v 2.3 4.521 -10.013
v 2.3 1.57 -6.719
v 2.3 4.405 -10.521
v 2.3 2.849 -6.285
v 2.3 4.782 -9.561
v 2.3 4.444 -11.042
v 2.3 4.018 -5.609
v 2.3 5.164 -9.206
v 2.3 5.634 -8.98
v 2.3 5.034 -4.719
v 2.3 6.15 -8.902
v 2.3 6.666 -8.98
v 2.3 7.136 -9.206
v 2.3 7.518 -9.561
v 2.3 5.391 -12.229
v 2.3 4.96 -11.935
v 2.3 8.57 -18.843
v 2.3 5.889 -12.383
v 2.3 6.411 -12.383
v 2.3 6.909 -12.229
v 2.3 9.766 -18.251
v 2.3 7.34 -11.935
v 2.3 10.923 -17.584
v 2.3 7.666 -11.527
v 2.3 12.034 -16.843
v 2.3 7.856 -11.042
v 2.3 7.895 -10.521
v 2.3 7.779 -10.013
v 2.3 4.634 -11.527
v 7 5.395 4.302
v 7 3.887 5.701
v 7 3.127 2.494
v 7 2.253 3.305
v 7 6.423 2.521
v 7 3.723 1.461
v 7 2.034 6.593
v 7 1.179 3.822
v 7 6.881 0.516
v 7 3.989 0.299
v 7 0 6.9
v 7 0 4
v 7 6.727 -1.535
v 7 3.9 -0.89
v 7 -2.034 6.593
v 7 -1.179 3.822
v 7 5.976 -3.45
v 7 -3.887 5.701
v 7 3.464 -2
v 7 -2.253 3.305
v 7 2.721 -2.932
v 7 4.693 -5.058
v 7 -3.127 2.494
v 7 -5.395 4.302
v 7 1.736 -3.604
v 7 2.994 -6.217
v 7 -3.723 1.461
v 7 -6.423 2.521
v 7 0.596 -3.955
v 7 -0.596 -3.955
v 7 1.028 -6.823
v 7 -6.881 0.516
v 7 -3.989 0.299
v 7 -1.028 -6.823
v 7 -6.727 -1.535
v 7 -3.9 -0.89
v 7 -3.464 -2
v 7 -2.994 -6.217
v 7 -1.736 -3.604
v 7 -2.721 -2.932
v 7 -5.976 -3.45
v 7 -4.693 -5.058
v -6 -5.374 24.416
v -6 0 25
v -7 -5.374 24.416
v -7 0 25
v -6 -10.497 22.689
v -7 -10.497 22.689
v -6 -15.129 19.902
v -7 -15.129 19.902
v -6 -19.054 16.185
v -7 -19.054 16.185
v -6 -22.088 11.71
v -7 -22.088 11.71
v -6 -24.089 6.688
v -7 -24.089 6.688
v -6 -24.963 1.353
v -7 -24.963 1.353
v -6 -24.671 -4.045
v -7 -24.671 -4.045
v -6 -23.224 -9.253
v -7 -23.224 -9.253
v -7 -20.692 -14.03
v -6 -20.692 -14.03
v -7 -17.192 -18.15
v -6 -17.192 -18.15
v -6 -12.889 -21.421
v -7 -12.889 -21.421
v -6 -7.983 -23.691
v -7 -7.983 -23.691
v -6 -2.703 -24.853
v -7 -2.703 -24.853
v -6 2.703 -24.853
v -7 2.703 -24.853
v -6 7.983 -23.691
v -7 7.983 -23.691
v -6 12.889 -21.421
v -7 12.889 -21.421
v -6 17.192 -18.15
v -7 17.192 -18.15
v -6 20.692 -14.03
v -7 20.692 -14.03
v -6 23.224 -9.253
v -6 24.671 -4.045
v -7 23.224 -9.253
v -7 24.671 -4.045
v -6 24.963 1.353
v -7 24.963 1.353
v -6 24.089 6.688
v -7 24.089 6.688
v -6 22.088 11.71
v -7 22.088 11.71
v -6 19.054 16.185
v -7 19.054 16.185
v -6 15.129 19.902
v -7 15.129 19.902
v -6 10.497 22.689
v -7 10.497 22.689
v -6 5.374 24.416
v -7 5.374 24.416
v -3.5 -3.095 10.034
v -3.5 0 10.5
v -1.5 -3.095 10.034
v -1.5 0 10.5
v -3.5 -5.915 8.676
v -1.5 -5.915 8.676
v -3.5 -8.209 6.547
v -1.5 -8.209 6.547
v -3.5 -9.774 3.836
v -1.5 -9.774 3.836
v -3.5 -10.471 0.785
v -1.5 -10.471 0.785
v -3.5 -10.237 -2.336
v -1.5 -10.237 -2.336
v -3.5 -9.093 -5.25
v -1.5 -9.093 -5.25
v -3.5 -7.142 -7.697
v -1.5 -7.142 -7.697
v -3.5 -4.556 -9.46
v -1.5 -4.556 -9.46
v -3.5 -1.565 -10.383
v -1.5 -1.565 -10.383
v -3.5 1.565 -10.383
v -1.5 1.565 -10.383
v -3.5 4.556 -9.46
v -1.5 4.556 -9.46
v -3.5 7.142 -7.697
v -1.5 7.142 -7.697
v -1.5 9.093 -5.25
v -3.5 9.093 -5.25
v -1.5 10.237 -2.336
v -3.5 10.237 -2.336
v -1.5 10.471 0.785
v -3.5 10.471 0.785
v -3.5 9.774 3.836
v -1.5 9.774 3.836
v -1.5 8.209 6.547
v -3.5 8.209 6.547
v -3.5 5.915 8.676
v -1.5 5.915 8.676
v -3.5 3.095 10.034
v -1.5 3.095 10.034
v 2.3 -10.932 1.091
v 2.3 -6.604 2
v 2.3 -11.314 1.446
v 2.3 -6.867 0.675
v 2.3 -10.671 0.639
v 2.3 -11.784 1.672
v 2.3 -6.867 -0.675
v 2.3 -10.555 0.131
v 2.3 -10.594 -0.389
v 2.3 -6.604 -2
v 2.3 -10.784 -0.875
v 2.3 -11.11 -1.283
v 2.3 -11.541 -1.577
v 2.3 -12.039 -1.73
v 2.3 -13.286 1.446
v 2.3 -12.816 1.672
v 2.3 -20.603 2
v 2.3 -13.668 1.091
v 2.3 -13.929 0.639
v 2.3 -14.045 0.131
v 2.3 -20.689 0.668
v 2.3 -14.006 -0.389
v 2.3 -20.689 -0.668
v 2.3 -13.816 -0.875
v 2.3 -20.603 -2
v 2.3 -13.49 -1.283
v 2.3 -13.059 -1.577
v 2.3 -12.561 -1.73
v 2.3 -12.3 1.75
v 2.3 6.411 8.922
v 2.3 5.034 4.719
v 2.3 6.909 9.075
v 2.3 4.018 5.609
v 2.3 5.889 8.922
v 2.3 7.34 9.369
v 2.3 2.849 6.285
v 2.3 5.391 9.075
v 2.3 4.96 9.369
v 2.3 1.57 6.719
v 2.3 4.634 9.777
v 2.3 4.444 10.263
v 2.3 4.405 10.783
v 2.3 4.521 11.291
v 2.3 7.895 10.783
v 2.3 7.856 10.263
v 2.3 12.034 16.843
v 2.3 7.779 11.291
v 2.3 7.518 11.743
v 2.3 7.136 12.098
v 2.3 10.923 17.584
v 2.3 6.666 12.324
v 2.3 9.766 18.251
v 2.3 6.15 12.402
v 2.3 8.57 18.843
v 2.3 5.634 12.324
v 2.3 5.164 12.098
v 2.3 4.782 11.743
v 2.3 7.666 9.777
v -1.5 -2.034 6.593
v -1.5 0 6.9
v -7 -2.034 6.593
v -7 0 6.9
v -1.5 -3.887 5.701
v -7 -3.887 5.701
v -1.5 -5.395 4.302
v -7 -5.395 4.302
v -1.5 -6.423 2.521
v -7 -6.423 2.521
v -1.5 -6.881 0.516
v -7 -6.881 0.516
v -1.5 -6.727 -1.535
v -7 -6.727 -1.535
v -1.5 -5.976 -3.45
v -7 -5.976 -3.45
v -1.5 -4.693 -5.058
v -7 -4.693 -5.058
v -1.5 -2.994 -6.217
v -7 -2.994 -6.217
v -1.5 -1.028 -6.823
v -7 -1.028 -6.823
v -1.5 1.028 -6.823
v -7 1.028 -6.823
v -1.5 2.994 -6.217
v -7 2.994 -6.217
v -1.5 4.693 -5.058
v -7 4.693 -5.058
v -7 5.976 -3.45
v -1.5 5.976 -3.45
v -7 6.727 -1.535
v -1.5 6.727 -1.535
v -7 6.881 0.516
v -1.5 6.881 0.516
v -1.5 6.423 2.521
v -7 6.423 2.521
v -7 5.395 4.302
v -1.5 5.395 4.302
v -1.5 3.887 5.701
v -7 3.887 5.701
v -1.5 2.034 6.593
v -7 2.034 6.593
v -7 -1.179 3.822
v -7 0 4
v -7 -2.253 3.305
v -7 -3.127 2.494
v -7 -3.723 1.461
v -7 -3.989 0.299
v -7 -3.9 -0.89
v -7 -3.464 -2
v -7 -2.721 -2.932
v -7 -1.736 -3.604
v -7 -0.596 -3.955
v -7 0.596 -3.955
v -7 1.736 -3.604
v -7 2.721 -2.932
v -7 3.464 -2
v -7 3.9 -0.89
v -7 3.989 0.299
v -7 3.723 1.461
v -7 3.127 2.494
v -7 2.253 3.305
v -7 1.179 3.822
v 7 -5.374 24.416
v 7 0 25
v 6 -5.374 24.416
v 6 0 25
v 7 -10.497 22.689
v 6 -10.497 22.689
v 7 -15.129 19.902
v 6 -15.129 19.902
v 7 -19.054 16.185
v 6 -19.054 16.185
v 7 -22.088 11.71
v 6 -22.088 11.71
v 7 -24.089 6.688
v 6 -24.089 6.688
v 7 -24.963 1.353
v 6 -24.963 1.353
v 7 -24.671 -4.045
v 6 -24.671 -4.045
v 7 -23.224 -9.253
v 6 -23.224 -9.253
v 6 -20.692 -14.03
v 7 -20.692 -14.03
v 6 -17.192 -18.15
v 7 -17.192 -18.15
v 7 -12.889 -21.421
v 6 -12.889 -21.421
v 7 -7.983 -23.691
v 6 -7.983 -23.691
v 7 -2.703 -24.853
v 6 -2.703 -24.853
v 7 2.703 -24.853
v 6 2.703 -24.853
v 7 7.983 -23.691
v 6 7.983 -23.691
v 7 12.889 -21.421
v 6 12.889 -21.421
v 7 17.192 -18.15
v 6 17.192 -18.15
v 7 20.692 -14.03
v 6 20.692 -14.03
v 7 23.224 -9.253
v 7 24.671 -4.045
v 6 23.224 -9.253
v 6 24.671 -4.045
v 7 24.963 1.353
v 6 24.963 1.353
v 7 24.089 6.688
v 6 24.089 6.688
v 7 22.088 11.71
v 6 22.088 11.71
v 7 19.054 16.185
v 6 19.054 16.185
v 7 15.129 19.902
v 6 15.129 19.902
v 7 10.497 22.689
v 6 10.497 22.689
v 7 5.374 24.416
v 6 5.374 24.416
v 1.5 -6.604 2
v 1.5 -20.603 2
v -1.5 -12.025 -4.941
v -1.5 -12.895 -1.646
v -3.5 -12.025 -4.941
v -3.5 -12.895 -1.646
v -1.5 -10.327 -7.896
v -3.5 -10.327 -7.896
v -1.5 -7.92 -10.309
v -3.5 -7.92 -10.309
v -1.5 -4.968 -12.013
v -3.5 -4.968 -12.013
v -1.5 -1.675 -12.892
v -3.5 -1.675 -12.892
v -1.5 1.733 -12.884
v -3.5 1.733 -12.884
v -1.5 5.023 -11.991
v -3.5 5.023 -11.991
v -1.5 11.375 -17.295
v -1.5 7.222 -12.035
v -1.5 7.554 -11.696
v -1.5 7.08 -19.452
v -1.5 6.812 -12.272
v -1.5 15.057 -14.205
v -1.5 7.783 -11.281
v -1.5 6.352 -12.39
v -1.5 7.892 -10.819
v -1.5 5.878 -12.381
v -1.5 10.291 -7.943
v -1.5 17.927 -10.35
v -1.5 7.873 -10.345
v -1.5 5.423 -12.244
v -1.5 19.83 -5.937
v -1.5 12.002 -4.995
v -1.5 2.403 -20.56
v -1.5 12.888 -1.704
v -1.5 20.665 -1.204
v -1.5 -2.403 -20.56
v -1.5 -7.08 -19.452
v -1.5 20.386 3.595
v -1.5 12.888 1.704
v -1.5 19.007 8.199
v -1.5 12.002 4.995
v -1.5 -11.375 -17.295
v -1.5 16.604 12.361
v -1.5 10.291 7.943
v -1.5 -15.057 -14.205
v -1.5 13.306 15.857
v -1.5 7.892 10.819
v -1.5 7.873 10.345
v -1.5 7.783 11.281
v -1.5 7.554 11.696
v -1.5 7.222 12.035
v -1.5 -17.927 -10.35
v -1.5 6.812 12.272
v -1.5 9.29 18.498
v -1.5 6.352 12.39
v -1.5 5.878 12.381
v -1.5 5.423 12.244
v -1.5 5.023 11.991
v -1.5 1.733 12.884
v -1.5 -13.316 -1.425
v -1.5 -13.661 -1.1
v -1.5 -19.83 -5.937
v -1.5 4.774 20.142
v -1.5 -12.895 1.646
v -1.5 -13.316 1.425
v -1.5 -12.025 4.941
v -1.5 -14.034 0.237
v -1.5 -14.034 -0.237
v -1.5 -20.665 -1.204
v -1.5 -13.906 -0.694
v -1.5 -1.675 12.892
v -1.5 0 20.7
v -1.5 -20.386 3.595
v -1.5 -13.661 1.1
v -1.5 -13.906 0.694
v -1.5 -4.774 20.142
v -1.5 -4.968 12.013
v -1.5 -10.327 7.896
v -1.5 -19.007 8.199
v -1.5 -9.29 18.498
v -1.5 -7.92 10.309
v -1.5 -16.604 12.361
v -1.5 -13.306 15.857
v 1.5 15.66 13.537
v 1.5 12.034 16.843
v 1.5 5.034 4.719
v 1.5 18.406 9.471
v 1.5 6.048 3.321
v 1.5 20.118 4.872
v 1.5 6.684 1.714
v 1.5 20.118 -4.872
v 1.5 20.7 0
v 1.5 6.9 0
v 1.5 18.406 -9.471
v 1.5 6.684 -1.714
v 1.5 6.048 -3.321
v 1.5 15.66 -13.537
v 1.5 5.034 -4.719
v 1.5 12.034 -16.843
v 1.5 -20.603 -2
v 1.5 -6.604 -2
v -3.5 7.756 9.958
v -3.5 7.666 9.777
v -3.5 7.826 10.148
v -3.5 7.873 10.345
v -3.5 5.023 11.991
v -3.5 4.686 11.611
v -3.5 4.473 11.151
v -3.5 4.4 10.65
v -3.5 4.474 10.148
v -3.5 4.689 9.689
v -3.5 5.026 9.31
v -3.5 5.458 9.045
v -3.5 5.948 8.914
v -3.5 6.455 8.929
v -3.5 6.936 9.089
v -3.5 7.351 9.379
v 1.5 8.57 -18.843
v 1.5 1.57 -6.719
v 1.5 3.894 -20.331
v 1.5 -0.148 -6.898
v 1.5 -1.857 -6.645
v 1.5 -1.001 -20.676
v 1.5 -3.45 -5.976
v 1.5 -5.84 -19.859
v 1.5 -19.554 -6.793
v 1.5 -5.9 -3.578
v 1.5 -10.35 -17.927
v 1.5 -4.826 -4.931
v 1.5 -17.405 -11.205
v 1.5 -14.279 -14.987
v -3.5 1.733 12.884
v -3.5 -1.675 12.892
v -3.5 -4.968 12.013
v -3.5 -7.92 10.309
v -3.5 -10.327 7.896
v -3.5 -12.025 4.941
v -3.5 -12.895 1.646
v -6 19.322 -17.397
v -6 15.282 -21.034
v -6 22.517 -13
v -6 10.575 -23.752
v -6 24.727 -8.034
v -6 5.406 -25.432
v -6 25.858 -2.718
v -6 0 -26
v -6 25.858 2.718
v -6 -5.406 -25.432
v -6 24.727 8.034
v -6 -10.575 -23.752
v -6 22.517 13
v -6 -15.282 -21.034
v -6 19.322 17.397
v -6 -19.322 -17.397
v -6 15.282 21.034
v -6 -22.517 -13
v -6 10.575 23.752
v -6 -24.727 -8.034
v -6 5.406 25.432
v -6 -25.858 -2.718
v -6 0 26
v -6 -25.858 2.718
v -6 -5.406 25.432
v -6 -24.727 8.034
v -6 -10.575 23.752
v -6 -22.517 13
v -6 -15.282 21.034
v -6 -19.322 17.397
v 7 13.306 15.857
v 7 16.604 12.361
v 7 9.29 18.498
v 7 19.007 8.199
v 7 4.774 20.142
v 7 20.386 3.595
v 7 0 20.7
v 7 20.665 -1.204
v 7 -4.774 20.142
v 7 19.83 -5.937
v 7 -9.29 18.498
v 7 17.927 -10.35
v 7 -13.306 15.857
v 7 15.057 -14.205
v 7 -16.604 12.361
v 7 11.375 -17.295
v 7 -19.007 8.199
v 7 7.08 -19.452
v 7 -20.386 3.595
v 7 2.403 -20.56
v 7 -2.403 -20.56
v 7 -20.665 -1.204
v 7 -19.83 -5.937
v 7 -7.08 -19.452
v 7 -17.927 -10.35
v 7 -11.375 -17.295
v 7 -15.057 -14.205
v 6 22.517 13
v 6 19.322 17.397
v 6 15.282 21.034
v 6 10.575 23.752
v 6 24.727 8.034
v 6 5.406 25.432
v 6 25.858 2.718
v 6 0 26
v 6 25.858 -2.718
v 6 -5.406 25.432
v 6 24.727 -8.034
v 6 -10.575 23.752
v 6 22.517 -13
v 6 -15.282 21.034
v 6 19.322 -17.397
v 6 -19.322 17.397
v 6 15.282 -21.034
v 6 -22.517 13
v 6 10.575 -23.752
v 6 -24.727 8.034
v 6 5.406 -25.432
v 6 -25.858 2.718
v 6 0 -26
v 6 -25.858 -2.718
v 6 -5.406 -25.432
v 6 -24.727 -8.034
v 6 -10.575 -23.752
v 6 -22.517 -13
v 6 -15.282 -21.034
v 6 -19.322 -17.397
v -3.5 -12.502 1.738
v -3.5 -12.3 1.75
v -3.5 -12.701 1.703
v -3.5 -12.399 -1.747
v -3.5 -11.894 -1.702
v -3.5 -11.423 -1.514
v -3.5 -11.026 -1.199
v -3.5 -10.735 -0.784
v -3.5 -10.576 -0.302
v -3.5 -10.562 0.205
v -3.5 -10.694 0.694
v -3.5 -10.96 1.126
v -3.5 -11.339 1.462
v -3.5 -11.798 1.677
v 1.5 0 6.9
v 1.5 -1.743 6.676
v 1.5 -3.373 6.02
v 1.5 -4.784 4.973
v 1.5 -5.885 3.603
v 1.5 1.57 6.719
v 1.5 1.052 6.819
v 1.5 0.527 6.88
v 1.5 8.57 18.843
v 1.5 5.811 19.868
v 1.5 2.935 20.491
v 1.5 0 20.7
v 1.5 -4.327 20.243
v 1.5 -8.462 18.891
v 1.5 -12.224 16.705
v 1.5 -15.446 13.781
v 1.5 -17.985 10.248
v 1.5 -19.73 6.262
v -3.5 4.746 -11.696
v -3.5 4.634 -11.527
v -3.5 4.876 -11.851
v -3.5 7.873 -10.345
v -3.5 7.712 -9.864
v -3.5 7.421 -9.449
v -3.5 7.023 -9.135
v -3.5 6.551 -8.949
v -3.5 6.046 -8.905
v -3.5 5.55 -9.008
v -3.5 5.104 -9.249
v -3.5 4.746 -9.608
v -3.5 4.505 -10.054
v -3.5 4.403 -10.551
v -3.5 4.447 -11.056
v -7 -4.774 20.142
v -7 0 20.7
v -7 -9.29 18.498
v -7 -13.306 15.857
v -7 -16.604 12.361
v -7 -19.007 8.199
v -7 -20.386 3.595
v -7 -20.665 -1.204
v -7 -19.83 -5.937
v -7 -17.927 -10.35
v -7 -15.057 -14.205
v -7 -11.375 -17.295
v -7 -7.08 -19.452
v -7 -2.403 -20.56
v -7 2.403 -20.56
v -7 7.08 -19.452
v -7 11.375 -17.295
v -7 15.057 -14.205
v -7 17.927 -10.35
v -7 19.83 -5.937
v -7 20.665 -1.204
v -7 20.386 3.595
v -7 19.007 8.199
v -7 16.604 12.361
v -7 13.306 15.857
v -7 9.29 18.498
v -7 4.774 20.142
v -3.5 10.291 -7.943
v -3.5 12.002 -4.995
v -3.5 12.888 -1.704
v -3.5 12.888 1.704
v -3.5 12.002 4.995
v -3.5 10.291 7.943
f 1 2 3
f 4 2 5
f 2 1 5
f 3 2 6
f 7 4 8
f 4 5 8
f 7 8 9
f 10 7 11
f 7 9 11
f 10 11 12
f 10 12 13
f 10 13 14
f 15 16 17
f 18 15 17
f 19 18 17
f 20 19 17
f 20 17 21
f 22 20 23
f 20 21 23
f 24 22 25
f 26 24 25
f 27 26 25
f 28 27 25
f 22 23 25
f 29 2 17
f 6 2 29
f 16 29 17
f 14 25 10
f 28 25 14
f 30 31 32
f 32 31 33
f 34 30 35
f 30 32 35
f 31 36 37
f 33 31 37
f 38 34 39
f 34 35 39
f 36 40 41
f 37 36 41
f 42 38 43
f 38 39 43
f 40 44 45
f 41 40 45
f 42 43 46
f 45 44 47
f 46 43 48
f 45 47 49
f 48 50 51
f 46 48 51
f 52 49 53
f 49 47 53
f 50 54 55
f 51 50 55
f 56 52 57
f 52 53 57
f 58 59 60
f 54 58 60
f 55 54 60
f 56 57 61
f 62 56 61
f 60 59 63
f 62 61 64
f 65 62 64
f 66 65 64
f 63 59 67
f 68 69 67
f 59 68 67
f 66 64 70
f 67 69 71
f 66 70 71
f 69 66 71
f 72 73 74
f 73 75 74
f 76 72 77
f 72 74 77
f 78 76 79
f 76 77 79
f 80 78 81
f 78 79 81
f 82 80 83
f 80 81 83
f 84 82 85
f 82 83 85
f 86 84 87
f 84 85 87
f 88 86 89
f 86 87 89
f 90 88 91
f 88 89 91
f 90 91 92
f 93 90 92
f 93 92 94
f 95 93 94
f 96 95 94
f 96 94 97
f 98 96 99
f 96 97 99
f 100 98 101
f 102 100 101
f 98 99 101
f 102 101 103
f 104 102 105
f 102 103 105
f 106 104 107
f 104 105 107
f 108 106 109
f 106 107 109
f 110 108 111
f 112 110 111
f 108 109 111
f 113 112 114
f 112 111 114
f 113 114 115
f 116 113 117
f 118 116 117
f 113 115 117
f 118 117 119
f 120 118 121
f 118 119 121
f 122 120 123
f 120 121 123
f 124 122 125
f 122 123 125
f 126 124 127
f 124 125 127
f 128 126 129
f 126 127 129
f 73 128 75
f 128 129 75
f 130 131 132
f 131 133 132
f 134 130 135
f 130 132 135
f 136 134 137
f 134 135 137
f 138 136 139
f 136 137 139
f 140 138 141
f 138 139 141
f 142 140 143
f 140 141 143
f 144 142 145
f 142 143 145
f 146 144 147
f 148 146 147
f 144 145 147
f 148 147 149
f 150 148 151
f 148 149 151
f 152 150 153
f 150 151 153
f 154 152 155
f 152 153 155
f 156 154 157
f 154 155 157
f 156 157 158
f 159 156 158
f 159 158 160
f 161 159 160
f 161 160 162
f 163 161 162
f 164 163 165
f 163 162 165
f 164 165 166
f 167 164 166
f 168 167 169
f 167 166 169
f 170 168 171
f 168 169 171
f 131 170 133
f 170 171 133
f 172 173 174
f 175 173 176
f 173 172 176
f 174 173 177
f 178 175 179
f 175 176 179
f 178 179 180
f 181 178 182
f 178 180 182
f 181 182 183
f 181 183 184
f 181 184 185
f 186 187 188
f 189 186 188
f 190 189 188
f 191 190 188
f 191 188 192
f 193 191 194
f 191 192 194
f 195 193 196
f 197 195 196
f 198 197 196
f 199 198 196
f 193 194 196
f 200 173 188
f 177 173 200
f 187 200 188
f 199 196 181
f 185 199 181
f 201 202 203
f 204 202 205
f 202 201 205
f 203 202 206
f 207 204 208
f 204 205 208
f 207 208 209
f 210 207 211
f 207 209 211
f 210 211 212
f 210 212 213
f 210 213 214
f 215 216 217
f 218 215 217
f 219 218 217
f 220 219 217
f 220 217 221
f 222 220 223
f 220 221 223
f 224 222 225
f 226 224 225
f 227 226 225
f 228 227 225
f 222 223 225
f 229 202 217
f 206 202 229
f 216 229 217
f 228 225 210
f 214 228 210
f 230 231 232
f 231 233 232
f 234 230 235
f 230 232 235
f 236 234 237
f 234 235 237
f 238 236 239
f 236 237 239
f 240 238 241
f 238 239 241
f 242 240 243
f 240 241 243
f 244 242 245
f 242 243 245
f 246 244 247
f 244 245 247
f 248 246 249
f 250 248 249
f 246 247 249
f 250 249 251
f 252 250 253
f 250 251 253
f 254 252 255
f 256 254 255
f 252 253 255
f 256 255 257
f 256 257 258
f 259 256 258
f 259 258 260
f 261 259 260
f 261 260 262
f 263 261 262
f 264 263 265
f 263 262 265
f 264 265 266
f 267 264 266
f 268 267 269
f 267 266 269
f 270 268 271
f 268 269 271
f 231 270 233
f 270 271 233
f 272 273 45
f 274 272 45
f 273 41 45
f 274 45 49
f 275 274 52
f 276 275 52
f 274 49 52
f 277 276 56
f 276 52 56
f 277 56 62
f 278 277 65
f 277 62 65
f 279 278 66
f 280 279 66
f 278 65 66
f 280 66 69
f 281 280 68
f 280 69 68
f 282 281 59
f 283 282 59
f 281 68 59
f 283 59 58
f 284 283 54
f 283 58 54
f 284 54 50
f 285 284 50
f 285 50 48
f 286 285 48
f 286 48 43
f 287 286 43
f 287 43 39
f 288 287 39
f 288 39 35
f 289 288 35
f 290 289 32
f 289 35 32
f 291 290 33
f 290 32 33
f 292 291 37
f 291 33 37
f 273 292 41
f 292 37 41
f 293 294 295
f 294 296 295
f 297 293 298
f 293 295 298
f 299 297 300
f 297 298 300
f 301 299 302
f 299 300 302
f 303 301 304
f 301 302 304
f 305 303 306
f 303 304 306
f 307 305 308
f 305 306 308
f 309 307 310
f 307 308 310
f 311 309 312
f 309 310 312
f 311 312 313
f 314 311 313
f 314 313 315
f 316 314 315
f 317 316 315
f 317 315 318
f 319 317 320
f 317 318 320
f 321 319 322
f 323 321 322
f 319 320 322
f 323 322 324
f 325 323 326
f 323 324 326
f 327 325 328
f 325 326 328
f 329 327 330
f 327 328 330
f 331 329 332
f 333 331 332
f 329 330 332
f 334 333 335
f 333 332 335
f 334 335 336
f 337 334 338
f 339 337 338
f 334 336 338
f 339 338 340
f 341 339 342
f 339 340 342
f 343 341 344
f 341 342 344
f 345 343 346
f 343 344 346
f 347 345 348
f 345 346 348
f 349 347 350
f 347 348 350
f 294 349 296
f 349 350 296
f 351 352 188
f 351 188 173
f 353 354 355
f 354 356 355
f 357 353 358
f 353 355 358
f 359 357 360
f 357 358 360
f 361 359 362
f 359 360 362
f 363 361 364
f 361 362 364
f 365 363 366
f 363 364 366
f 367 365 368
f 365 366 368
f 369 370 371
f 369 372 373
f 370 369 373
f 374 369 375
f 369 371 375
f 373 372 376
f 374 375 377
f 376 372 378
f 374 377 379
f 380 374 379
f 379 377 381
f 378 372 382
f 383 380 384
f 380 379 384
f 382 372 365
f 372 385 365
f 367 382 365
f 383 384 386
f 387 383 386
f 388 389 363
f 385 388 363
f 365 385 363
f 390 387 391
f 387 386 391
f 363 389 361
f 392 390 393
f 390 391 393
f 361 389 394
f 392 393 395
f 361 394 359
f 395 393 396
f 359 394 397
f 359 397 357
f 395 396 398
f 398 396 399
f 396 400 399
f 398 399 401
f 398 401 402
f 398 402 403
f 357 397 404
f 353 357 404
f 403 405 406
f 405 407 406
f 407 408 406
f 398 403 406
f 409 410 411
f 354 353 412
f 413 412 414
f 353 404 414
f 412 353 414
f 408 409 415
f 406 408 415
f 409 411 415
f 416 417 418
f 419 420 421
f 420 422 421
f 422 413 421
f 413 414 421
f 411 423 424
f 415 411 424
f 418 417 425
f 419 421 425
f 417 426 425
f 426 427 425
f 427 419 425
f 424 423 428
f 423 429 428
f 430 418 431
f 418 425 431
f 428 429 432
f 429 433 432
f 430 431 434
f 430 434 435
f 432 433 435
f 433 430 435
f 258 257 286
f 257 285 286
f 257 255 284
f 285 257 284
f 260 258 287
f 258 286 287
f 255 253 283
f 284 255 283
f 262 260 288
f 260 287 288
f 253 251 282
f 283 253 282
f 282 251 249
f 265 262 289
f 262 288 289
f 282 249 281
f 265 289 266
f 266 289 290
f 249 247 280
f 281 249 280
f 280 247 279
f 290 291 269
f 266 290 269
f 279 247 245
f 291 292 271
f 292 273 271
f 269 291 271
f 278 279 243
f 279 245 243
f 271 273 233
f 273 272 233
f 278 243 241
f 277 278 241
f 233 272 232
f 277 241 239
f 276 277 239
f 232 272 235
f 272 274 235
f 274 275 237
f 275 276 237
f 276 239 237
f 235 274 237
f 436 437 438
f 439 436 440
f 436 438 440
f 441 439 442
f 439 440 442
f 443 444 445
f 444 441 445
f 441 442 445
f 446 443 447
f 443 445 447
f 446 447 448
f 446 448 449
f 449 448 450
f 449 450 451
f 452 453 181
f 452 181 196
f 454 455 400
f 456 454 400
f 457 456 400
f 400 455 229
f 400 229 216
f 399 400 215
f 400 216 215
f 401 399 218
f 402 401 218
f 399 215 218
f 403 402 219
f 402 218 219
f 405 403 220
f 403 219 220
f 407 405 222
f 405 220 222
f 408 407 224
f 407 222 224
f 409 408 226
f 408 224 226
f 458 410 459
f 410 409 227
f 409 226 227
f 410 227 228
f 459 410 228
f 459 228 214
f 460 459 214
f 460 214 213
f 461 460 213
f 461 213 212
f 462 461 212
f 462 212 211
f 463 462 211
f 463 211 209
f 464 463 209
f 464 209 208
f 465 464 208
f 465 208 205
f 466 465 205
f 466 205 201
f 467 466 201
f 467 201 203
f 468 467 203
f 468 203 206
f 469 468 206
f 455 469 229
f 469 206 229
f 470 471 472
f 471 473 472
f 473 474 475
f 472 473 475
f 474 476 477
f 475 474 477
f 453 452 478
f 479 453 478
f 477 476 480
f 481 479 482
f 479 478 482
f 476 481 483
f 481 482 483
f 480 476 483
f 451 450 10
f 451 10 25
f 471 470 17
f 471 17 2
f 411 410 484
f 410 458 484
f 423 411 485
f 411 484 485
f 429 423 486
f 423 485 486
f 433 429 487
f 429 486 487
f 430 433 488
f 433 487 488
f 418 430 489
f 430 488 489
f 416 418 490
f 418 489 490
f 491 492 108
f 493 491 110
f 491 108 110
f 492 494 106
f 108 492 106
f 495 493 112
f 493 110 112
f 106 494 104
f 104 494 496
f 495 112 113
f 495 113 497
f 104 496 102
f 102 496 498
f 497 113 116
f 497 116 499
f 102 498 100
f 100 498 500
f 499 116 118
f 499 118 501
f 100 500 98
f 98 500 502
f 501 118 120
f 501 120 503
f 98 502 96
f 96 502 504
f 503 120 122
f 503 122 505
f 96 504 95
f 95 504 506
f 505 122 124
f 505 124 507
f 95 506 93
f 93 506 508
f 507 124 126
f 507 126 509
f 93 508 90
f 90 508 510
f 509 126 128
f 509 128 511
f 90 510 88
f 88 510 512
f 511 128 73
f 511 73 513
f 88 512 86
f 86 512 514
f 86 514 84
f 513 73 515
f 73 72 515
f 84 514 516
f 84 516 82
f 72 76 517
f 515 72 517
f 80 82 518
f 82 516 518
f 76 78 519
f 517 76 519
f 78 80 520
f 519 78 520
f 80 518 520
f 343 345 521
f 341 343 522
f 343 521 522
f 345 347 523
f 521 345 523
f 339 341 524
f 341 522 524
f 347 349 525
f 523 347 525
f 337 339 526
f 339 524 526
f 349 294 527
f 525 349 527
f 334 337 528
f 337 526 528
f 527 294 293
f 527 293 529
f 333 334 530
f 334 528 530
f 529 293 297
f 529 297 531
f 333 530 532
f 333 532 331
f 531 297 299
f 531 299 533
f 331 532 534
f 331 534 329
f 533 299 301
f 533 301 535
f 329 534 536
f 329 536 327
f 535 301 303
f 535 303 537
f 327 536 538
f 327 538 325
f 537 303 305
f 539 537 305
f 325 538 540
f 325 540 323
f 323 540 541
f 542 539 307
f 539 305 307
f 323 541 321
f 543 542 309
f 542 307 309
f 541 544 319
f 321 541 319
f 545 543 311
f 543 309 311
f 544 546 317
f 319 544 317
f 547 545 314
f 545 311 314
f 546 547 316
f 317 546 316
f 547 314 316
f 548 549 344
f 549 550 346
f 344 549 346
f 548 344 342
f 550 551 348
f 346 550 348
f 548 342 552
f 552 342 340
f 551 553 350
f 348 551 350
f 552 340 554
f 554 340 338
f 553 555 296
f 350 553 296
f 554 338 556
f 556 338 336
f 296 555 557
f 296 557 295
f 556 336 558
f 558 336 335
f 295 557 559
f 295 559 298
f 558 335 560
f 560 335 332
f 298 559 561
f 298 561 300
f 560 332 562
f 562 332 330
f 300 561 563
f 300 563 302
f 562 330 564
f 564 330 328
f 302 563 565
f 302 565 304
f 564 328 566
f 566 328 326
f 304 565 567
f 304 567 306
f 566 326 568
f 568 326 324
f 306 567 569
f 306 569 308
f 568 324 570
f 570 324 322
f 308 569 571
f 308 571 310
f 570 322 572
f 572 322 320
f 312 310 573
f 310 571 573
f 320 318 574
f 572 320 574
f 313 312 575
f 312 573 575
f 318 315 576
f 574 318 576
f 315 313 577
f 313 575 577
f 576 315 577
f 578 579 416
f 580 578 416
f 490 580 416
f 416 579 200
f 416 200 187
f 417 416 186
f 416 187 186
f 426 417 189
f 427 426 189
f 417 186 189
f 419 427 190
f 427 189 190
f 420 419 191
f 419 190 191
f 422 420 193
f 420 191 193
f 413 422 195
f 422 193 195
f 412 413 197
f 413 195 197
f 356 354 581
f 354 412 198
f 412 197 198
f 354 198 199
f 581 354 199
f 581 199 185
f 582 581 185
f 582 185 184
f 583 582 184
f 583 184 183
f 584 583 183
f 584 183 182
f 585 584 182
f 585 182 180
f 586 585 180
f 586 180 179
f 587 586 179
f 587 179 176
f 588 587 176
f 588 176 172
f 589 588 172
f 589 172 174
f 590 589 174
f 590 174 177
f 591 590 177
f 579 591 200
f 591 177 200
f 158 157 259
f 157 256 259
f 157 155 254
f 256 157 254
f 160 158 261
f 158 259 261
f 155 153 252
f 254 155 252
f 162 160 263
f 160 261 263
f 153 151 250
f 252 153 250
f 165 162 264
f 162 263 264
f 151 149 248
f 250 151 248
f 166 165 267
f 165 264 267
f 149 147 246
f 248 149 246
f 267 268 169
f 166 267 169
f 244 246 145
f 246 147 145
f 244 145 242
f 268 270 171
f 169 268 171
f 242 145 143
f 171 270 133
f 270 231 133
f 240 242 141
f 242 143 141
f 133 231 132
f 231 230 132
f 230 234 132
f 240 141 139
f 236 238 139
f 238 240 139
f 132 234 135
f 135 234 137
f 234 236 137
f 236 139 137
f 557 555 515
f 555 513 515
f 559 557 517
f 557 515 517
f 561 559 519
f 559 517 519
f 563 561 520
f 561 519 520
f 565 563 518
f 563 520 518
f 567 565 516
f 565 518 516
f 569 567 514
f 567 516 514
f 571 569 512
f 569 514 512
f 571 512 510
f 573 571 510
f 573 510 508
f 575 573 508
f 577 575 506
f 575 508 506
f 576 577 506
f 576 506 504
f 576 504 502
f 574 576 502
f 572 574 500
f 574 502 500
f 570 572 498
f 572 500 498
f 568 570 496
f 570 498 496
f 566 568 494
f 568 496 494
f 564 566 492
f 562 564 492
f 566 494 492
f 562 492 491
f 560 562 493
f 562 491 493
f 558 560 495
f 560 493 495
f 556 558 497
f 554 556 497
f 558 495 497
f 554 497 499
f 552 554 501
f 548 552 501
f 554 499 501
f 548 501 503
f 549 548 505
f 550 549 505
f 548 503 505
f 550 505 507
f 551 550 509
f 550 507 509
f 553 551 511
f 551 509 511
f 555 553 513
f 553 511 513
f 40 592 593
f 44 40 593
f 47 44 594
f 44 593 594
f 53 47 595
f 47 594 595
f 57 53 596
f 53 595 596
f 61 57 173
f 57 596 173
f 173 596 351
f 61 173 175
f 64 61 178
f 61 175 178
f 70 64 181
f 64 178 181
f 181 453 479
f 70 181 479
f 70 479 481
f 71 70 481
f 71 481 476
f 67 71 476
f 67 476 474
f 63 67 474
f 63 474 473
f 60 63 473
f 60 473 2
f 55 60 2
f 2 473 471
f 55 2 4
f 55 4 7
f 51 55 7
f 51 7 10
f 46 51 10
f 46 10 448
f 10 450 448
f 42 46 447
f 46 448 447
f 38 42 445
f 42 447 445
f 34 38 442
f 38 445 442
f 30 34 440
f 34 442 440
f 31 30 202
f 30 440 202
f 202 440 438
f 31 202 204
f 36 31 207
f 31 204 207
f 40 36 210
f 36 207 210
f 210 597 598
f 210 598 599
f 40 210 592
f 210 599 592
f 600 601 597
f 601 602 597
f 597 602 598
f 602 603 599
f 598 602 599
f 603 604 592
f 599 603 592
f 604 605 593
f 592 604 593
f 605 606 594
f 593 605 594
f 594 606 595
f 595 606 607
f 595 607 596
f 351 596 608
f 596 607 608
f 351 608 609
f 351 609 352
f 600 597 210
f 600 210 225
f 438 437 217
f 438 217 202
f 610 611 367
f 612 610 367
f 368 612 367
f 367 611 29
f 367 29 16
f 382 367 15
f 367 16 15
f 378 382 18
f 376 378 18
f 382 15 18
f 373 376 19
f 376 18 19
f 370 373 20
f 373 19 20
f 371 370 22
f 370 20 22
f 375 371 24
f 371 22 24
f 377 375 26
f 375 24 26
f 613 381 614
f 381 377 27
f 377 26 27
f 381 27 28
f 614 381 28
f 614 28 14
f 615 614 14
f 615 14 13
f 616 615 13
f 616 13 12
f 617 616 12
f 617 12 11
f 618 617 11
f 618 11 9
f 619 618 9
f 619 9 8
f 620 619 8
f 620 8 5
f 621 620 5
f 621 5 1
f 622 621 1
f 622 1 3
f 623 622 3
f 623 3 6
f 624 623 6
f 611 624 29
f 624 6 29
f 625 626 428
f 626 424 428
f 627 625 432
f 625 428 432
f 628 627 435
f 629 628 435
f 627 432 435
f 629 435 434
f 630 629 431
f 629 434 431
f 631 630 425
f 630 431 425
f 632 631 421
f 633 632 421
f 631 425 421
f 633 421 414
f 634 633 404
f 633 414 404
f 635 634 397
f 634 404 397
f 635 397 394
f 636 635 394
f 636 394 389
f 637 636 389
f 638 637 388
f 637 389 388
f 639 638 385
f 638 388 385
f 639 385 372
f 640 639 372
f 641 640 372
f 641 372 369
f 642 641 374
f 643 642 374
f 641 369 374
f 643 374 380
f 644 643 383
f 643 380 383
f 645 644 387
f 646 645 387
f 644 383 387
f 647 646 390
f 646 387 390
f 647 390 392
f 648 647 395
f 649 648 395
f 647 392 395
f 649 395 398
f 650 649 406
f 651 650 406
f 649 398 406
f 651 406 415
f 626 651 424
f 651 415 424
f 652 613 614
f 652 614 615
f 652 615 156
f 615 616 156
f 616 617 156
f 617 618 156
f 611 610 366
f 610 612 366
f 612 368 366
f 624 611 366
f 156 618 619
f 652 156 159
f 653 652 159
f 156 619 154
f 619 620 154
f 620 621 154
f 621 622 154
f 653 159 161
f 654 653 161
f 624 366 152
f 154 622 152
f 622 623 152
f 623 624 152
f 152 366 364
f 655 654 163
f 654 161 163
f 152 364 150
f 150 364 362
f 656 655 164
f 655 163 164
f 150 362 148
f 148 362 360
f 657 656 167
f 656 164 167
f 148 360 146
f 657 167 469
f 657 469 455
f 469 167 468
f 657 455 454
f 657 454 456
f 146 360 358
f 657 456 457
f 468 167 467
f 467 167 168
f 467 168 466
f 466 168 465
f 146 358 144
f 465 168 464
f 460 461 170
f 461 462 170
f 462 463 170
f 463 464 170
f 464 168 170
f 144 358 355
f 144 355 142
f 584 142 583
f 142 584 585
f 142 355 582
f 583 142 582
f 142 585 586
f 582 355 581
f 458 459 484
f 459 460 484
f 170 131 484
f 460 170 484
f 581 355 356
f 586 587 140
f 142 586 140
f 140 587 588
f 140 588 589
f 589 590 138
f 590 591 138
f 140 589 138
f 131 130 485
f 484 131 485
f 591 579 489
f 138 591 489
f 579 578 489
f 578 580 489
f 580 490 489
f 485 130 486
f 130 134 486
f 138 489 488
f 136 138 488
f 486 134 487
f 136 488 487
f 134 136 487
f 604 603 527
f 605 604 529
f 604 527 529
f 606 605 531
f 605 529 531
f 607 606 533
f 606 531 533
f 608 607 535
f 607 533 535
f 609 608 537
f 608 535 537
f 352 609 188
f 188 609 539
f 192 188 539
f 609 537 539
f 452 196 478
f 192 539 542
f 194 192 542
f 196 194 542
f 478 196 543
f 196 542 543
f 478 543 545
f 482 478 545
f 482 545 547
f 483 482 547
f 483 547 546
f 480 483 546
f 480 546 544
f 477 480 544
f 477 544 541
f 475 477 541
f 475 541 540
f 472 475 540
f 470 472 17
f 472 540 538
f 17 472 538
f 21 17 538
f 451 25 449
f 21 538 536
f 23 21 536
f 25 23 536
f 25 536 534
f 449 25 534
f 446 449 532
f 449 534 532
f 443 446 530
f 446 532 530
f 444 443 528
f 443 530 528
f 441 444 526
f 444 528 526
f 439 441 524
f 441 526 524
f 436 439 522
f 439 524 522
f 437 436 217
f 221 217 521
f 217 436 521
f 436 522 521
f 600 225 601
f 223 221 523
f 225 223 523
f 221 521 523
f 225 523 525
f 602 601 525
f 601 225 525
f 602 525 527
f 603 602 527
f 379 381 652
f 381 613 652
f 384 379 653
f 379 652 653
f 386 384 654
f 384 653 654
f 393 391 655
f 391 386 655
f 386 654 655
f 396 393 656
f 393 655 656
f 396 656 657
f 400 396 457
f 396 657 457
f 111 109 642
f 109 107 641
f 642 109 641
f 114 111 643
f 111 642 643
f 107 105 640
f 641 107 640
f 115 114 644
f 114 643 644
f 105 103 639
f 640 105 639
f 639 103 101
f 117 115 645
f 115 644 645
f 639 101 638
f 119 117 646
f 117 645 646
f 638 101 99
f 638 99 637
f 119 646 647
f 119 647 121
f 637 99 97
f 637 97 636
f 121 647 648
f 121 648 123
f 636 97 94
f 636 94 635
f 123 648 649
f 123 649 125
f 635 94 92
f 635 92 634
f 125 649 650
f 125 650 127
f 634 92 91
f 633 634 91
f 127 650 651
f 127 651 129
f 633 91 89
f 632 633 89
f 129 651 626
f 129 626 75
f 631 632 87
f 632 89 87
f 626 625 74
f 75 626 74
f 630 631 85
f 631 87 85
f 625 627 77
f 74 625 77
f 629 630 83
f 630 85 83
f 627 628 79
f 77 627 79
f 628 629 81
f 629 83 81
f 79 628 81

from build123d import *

# Parameters (mm, degrees)
PAD_DEPTH             = 0.8
POLARPATTERN_COUNT    = 3
SKETCH002_R           = 1.75
POCKET_DEPTH          = 163.720738
POLARPATTERN001_COUNT = 3


with BuildPart() as part:
    # Sketch → Revolution (revolve)
    with BuildSketch(Plane.XZ):
        Polygon((-7, 4), (7, 4), (7, 6.9), (1.5, 6.9), (1.5, 20.7), (7, 20.7), (7, 25), (6, 25), (6, 26), (-6, 26), (-6, 25), (-7, 25), (-7, 20.7), (-1.5, 20.7), (-1.5, 13), (-3.5, 13), (-3.5, 10.5), (-1.5, 10.5), (-1.5, 6.9), (-7, 6.9), align=None)
    revolve(axis=Axis((0, 0, 0), (1, 0, 0)))

    # Sketch001 (on Face4 of Revolution) → Pad (new body)
    with BuildSketch(Plane(origin=(1.5, 0, 0), x_dir=(0, 0, 1), z_dir=(1, 0, 0))):
        with BuildLine():
            Line((2, 20.603155), (2, 6.603787))
            ThreePointArc((2, 6.603787), (0, 6.9), (-2, 6.603787))
            Line((-2, 6.603787), (-2, 20.603155))
            ThreePointArc((2, 20.603155), (0, 20.7), (-2, 20.603155))
        make_face()
    pad = extrude(amount=PAD_DEPTH)

    # PolarPattern: Pad ×3 about axis
    polarpattern_axis = Axis((1.5, 0, 0), (1, 0, 0))
    for i in range(1, POLARPATTERN_COUNT):
        add(pad.rotate(polarpattern_axis, i * 360 / POLARPATTERN_COUNT))

    # Sketch002 (on Face22 of PolarPattern) → Pocket (cut, through all)
    with BuildSketch(Plane(origin=(7, 0, 0), x_dir=(0, 0, 1), z_dir=(1, 0, 0))):
        with Locations((0, 12.3)):
            Circle(SKETCH002_R)
    pocket = extrude(amount=-POCKET_DEPTH, mode=Mode.SUBTRACT)

    # PolarPattern001: Pocket ×3 about axis
    polarpattern001_axis = Axis((7, 0, 0), (1, 0, 0))
    for i in range(1, POLARPATTERN001_COUNT):
        add(pocket.rotate(polarpattern001_axis, i * 360 / POLARPATTERN001_COUNT), mode=Mode.SUBTRACT)


solid = part.part
